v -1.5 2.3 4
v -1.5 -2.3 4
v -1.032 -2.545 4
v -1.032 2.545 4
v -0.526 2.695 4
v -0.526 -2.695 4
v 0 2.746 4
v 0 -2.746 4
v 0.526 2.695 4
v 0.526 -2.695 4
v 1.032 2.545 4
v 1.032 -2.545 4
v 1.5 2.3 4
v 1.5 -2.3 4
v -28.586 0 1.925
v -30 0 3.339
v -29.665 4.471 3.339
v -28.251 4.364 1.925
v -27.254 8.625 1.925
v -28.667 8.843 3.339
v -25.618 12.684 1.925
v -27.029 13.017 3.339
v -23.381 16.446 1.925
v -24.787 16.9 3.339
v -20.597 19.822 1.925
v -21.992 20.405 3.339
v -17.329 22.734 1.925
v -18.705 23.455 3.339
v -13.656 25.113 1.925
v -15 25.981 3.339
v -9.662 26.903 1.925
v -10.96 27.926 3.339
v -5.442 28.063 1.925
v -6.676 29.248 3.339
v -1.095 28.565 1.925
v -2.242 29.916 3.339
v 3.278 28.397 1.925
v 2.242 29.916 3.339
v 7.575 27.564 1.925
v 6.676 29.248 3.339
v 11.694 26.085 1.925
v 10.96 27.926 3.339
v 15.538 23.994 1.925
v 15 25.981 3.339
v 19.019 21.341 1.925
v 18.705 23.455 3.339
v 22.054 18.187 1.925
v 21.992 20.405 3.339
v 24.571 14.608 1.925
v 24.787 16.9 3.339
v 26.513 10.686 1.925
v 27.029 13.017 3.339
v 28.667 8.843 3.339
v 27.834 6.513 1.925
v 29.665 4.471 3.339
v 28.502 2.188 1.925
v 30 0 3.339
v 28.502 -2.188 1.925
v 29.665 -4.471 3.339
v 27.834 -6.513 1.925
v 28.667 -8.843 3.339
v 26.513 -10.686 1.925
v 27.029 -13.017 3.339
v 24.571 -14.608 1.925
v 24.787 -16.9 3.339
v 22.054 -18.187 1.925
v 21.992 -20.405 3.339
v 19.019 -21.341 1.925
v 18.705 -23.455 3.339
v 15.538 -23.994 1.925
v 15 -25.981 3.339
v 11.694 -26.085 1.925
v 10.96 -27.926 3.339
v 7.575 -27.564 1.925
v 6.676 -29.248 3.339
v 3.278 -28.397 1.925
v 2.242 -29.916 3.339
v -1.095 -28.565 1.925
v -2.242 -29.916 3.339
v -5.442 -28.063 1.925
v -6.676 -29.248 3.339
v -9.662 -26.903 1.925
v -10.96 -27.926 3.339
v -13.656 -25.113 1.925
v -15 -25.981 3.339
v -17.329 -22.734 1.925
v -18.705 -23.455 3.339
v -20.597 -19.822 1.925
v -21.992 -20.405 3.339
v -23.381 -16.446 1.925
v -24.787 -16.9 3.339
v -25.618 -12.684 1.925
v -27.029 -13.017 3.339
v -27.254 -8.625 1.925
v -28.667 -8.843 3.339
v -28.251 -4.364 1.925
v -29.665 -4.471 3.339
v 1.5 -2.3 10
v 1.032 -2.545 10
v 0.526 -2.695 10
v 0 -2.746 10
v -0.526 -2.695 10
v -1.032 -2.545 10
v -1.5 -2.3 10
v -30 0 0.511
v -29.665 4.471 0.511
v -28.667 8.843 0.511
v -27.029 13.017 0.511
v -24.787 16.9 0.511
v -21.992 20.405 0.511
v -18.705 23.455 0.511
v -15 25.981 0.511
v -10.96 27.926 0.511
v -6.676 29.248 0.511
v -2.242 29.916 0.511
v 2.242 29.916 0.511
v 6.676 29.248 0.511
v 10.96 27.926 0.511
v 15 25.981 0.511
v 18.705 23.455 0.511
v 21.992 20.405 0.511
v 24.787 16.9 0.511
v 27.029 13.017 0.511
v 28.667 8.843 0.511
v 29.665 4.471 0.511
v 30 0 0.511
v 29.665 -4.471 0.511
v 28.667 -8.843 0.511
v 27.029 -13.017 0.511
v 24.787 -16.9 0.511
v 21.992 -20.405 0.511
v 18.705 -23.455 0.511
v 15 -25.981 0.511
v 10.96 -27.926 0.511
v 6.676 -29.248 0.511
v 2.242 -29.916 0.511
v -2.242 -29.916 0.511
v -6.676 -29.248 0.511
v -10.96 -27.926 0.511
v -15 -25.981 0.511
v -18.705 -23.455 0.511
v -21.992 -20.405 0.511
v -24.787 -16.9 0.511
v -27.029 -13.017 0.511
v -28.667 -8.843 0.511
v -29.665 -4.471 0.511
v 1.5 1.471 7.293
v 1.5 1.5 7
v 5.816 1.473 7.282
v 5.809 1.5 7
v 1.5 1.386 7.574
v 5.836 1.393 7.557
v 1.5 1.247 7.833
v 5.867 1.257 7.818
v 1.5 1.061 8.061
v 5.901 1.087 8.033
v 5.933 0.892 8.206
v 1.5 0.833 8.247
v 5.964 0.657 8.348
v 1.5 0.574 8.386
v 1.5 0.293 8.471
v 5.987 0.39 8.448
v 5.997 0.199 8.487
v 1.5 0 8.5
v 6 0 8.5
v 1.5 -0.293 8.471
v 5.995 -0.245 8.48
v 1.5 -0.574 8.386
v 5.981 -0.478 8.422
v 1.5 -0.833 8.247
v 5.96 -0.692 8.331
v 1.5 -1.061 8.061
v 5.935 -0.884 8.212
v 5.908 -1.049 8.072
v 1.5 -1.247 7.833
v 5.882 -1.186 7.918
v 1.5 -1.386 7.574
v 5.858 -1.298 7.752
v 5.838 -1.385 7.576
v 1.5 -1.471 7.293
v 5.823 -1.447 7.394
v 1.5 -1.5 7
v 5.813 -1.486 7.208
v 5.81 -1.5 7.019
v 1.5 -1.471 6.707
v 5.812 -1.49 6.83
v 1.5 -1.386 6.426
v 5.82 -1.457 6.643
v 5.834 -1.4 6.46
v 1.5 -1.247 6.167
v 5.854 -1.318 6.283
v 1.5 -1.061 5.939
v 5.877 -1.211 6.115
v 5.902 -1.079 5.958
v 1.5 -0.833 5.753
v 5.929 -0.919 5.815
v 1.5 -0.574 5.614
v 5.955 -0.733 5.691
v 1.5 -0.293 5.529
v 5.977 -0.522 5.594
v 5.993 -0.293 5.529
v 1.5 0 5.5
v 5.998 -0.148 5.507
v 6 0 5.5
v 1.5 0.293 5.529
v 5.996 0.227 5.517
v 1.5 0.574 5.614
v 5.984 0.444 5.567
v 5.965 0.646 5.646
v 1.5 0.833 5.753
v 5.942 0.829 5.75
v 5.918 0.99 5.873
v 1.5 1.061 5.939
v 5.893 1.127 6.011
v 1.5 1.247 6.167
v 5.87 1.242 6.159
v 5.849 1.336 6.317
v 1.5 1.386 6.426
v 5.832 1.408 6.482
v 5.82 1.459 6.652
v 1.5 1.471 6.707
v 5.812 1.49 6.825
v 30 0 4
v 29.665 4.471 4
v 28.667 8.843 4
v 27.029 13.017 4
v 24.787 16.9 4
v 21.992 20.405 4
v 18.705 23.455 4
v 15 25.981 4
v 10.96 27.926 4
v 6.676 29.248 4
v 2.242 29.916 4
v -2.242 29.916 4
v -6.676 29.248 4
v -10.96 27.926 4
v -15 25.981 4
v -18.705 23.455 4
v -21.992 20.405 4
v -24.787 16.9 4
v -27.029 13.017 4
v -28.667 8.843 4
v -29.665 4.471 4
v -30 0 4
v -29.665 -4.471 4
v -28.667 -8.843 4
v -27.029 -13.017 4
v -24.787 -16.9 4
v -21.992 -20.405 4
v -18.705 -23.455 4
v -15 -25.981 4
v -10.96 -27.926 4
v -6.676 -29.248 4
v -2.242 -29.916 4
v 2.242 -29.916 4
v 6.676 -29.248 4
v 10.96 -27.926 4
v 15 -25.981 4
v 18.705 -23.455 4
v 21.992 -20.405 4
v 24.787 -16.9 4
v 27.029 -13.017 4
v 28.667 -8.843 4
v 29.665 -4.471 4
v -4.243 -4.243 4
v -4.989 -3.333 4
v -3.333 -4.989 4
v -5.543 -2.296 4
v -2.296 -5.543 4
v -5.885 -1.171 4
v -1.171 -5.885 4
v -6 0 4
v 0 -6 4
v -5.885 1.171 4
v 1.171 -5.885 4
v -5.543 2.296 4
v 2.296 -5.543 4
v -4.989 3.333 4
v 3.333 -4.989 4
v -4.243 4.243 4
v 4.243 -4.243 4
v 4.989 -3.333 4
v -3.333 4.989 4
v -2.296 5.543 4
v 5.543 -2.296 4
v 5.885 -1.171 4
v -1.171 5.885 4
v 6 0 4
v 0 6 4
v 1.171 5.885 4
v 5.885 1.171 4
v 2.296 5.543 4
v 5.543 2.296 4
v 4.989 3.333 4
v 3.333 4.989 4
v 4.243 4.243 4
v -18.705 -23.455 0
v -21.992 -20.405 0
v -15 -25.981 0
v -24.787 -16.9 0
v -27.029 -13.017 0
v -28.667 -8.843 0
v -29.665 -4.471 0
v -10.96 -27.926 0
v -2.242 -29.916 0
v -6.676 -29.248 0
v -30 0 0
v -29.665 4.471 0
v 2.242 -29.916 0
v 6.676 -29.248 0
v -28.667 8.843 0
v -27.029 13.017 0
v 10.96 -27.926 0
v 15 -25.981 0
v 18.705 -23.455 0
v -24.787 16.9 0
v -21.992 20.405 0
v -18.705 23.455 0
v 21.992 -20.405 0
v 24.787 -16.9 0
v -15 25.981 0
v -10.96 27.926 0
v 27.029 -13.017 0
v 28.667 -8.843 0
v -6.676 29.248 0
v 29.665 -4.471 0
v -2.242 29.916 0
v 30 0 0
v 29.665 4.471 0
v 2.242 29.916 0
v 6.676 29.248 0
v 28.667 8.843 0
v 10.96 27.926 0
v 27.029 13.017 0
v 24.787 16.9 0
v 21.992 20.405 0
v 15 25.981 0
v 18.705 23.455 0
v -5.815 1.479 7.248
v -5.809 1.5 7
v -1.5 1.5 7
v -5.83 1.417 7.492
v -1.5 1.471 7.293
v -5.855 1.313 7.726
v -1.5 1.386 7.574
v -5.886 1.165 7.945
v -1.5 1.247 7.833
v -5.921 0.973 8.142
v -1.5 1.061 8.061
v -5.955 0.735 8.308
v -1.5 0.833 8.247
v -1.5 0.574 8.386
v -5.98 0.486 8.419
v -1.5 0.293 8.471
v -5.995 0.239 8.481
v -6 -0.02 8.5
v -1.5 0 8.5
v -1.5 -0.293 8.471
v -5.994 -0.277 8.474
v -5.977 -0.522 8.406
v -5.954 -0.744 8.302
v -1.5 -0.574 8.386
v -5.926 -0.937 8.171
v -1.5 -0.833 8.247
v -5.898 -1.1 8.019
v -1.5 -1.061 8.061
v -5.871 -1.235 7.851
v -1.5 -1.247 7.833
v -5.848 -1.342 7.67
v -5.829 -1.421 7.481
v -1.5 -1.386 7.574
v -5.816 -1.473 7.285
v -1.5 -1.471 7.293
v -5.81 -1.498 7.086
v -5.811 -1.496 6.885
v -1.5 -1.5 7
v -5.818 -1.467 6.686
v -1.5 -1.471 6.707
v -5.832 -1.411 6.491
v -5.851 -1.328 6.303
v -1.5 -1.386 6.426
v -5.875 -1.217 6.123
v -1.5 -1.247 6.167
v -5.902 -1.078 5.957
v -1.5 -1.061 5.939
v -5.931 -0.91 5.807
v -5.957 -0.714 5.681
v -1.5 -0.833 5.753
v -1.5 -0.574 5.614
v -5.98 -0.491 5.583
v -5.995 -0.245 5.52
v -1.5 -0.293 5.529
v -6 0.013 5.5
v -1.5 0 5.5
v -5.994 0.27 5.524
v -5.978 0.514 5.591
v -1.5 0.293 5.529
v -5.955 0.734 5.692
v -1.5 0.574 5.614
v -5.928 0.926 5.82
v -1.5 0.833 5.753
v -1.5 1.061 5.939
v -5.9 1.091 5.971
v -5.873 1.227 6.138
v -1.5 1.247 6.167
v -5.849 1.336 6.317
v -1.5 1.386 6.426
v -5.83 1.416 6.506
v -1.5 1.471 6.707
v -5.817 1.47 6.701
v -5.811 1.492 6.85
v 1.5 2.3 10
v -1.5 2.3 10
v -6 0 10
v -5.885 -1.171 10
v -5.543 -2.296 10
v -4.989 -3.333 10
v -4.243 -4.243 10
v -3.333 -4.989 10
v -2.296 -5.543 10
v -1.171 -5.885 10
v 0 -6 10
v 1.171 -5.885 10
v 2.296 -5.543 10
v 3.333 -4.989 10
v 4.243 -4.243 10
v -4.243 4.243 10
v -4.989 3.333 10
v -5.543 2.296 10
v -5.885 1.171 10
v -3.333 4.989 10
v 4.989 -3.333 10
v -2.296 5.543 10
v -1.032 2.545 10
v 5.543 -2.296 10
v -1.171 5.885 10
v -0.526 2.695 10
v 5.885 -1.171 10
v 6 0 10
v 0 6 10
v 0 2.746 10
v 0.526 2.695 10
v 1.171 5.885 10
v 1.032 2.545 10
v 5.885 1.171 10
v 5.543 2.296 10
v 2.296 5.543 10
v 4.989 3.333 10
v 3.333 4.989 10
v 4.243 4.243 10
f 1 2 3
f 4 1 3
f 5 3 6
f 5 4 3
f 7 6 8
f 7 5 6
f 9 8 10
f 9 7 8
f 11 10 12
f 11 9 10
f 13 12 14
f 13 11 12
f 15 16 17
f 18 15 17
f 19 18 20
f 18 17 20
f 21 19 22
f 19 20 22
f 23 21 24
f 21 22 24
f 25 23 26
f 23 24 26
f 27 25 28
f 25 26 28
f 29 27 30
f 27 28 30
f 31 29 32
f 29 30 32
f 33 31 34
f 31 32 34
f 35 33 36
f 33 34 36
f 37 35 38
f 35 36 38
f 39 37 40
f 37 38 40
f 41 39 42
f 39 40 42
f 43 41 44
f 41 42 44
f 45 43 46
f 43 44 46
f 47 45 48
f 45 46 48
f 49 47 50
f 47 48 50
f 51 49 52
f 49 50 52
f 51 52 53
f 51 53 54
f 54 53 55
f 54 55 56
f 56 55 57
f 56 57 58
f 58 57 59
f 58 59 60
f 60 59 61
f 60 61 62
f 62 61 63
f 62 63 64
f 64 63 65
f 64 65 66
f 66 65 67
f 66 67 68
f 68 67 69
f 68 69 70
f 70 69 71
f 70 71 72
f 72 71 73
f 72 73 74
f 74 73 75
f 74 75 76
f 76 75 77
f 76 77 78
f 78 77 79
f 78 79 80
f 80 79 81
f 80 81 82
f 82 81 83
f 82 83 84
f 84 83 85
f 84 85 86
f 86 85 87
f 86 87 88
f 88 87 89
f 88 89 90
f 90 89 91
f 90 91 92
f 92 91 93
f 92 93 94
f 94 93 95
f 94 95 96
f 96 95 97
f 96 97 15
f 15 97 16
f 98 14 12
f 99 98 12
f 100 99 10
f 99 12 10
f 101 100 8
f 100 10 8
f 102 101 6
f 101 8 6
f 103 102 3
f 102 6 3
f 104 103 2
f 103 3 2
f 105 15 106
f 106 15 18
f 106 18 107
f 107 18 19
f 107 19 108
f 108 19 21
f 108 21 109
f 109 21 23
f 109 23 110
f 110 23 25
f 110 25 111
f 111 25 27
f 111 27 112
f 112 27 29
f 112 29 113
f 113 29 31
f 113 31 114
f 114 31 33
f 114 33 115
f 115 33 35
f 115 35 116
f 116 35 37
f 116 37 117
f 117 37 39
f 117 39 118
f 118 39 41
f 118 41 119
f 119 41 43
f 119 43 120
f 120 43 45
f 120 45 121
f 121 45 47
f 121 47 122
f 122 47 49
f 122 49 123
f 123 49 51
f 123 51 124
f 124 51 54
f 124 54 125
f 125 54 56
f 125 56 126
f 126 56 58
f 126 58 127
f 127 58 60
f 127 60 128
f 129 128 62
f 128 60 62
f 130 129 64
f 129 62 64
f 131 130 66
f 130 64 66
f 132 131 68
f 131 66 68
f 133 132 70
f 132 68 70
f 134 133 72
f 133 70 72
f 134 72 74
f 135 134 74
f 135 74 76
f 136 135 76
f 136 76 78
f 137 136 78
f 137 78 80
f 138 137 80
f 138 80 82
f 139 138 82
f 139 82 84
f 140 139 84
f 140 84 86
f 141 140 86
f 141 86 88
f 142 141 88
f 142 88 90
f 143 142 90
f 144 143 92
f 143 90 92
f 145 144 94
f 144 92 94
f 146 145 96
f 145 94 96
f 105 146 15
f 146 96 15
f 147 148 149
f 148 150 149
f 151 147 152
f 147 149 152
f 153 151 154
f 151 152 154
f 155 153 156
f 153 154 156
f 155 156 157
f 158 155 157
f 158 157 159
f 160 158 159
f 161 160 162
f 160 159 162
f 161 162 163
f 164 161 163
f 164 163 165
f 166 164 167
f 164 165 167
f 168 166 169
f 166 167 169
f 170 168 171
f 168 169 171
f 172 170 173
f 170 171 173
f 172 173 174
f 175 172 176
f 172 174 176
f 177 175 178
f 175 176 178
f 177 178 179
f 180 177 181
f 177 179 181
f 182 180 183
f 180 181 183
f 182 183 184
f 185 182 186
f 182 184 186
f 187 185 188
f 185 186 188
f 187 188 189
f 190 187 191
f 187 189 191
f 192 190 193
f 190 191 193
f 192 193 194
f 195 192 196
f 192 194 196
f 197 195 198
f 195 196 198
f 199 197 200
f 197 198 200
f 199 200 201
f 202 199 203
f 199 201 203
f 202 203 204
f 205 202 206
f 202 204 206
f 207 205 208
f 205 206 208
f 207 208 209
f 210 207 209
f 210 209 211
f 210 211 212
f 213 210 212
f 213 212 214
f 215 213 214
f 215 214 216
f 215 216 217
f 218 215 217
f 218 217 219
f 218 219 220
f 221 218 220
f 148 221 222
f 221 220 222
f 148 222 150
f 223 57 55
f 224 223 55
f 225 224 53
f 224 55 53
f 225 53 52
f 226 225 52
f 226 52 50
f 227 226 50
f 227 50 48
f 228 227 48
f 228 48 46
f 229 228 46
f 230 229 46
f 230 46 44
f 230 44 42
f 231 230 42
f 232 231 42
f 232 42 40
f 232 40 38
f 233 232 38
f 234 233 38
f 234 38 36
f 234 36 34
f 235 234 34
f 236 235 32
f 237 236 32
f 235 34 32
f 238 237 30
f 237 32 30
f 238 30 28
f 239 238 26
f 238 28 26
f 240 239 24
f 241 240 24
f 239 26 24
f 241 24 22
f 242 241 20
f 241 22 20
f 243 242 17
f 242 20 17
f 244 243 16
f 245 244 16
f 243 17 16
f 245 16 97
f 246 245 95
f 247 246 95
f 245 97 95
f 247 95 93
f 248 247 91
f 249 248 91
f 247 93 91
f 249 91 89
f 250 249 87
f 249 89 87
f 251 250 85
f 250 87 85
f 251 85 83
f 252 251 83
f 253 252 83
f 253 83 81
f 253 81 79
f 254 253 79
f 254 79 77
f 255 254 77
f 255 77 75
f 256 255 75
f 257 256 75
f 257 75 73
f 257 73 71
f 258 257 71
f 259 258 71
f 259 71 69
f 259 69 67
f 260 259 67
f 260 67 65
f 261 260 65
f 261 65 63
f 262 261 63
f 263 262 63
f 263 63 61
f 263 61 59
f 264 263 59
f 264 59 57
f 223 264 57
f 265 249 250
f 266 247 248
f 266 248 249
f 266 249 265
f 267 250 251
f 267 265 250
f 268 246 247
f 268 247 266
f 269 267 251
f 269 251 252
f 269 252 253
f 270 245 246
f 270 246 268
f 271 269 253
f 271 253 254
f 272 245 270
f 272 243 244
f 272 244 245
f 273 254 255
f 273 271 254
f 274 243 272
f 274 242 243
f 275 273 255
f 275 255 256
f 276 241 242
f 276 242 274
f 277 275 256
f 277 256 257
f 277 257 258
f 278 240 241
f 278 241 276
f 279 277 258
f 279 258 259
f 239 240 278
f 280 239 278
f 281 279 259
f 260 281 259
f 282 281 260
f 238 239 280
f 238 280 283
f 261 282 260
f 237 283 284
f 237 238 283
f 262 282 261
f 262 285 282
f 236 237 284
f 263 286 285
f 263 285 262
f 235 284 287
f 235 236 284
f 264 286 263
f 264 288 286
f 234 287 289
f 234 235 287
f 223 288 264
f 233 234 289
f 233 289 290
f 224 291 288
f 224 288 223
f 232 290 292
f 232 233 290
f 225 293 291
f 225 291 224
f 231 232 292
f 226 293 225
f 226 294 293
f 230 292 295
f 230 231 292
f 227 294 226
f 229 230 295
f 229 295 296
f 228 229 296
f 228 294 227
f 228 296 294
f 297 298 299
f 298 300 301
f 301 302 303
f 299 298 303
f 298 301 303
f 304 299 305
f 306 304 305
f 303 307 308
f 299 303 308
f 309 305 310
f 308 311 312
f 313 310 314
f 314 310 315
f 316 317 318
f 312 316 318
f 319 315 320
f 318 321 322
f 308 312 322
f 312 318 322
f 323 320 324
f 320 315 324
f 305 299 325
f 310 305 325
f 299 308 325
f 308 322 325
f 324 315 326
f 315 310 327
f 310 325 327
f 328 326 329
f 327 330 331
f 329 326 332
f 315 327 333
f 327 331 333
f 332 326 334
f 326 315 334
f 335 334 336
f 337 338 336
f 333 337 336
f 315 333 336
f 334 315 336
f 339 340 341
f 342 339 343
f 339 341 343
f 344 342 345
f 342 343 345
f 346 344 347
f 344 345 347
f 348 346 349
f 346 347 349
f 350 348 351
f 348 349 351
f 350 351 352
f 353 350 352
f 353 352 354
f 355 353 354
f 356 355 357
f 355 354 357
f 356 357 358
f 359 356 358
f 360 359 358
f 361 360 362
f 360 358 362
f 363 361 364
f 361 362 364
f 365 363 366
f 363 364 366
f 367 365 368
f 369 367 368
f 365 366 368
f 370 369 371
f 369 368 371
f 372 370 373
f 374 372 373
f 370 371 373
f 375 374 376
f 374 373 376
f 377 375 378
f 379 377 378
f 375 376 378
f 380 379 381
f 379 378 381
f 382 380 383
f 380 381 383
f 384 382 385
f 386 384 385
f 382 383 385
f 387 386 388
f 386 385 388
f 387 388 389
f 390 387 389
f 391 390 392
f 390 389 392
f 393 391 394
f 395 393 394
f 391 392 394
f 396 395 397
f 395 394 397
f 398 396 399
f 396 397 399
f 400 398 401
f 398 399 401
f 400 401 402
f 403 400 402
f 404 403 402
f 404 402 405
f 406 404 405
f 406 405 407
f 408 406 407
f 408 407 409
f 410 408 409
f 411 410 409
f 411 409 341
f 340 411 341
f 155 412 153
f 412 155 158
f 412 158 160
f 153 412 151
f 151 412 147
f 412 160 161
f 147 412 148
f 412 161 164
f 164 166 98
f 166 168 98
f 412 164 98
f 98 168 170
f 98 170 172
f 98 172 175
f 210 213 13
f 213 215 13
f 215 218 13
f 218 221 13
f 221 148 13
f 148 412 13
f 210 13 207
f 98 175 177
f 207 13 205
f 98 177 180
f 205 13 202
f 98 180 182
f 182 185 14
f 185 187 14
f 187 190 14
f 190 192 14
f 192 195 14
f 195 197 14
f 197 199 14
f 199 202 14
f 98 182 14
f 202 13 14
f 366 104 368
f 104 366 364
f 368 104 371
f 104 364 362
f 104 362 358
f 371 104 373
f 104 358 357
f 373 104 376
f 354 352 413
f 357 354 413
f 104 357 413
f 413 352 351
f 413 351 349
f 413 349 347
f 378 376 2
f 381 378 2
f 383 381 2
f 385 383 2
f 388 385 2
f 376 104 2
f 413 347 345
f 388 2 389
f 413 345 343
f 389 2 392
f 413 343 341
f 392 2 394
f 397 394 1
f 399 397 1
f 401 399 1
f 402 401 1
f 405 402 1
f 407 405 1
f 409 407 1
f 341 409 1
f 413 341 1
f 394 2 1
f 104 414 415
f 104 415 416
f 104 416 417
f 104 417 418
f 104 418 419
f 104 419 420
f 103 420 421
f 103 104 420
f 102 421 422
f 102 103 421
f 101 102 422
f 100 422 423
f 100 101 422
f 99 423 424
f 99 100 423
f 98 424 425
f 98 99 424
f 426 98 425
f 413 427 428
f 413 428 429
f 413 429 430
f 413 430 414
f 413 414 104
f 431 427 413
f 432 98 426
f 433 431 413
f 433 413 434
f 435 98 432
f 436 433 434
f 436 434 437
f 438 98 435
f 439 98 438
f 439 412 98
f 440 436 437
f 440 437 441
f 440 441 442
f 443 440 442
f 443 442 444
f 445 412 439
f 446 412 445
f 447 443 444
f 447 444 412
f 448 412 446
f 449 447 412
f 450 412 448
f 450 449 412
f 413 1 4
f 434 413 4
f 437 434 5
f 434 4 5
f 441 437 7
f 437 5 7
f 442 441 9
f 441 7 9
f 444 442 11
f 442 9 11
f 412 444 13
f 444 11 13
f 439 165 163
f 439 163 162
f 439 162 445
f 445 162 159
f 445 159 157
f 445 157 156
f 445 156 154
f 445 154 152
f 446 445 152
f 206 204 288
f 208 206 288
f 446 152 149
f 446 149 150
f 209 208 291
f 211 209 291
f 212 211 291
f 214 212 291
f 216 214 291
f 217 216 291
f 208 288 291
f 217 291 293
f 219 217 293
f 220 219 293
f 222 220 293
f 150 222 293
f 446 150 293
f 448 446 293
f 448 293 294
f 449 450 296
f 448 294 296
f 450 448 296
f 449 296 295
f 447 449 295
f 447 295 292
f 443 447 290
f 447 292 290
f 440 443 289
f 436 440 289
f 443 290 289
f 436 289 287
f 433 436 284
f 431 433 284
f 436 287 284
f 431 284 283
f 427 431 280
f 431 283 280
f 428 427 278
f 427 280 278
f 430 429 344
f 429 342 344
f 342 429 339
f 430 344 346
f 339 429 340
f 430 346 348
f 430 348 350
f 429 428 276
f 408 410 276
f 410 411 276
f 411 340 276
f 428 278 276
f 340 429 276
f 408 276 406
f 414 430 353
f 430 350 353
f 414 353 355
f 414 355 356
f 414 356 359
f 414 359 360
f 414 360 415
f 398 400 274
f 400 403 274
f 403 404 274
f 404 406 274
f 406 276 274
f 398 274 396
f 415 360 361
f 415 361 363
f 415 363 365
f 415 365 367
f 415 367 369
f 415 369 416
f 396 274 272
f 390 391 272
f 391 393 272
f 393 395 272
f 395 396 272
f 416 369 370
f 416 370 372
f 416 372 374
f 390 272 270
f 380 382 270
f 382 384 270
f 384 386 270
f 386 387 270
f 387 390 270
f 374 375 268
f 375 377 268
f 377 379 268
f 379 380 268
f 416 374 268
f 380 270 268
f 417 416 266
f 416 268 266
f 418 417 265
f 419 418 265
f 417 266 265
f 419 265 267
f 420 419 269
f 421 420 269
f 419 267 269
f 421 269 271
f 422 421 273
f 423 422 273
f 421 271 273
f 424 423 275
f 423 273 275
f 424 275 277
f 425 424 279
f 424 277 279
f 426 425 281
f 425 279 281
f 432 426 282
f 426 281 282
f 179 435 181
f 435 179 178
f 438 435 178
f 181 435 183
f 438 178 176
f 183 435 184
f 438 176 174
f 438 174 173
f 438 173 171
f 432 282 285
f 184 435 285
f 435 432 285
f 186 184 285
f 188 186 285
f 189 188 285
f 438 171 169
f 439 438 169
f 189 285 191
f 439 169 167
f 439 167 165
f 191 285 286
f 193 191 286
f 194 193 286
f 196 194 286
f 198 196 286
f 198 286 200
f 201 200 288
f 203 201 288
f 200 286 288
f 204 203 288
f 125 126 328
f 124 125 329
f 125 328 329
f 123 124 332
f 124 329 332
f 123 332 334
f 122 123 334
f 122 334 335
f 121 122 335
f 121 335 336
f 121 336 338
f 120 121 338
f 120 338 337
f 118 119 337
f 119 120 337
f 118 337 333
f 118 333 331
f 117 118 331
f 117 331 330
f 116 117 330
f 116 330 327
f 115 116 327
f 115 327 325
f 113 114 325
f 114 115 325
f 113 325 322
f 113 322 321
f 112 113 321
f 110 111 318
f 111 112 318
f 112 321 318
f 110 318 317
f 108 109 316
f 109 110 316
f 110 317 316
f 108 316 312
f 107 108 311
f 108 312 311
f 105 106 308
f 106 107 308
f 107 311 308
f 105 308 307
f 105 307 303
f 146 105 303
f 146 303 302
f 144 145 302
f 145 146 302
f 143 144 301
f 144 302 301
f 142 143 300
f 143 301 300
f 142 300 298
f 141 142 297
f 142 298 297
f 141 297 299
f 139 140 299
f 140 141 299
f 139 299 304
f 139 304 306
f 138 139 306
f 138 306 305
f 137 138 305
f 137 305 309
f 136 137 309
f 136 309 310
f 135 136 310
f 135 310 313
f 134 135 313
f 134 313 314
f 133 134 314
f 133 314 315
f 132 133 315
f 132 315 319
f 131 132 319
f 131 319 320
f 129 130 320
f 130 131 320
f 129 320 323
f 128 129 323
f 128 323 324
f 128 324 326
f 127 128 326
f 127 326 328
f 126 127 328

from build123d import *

# Parameters (mm, degrees)
F0_R     = 30
F1_DEPTH = 4
F2_R     = 6
F3_DEPTH = 6
F4_R     = 1.5
F5_DEPTH = 12.3


with BuildPart() as f1:
    # F0 (on Top) → F1 (new body)
    with BuildSketch(Plane.XY):
        Circle(F0_R)
    extrude(amount=F1_DEPTH)

    # F2 (on face) → F3 (join)
    with BuildSketch(Plane.XY.offset(4)):
        Circle(F2_R)
        with BuildLine():
            Line((1.5, 2.3), (1.5, -2.3))
            ThreePointArc((1.5, -2.3), (0, -2.745906), (-1.5, -2.3))
            Line((-1.5, -2.3), (-1.5, 2.3))
            ThreePointArc((-1.5, 2.3), (0, 2.745906), (1.5, 2.3))
        make_face(mode=Mode.SUBTRACT)
    extrude(amount=F3_DEPTH)

    # F4 (on Right) → F5 (cut, symmetric)
    with BuildSketch(Plane.YZ):
        with Locations((0, 7)):
            Circle(F4_R)
    extrude(amount=F5_DEPTH, both=True, mode=Mode.SUBTRACT)

    # F6 (on Front) → F7 (revolve, cut)
    with BuildSketch(Plane.XZ):
        Polygon((-30, 3.33949), (-30, 0.511062), (-28.585786, 1.925276), align=None)
    revolve(axis=Axis((0, 0, 6.11444), (0, 0, -1)), mode=Mode.SUBTRACT)


solid = f1.part
